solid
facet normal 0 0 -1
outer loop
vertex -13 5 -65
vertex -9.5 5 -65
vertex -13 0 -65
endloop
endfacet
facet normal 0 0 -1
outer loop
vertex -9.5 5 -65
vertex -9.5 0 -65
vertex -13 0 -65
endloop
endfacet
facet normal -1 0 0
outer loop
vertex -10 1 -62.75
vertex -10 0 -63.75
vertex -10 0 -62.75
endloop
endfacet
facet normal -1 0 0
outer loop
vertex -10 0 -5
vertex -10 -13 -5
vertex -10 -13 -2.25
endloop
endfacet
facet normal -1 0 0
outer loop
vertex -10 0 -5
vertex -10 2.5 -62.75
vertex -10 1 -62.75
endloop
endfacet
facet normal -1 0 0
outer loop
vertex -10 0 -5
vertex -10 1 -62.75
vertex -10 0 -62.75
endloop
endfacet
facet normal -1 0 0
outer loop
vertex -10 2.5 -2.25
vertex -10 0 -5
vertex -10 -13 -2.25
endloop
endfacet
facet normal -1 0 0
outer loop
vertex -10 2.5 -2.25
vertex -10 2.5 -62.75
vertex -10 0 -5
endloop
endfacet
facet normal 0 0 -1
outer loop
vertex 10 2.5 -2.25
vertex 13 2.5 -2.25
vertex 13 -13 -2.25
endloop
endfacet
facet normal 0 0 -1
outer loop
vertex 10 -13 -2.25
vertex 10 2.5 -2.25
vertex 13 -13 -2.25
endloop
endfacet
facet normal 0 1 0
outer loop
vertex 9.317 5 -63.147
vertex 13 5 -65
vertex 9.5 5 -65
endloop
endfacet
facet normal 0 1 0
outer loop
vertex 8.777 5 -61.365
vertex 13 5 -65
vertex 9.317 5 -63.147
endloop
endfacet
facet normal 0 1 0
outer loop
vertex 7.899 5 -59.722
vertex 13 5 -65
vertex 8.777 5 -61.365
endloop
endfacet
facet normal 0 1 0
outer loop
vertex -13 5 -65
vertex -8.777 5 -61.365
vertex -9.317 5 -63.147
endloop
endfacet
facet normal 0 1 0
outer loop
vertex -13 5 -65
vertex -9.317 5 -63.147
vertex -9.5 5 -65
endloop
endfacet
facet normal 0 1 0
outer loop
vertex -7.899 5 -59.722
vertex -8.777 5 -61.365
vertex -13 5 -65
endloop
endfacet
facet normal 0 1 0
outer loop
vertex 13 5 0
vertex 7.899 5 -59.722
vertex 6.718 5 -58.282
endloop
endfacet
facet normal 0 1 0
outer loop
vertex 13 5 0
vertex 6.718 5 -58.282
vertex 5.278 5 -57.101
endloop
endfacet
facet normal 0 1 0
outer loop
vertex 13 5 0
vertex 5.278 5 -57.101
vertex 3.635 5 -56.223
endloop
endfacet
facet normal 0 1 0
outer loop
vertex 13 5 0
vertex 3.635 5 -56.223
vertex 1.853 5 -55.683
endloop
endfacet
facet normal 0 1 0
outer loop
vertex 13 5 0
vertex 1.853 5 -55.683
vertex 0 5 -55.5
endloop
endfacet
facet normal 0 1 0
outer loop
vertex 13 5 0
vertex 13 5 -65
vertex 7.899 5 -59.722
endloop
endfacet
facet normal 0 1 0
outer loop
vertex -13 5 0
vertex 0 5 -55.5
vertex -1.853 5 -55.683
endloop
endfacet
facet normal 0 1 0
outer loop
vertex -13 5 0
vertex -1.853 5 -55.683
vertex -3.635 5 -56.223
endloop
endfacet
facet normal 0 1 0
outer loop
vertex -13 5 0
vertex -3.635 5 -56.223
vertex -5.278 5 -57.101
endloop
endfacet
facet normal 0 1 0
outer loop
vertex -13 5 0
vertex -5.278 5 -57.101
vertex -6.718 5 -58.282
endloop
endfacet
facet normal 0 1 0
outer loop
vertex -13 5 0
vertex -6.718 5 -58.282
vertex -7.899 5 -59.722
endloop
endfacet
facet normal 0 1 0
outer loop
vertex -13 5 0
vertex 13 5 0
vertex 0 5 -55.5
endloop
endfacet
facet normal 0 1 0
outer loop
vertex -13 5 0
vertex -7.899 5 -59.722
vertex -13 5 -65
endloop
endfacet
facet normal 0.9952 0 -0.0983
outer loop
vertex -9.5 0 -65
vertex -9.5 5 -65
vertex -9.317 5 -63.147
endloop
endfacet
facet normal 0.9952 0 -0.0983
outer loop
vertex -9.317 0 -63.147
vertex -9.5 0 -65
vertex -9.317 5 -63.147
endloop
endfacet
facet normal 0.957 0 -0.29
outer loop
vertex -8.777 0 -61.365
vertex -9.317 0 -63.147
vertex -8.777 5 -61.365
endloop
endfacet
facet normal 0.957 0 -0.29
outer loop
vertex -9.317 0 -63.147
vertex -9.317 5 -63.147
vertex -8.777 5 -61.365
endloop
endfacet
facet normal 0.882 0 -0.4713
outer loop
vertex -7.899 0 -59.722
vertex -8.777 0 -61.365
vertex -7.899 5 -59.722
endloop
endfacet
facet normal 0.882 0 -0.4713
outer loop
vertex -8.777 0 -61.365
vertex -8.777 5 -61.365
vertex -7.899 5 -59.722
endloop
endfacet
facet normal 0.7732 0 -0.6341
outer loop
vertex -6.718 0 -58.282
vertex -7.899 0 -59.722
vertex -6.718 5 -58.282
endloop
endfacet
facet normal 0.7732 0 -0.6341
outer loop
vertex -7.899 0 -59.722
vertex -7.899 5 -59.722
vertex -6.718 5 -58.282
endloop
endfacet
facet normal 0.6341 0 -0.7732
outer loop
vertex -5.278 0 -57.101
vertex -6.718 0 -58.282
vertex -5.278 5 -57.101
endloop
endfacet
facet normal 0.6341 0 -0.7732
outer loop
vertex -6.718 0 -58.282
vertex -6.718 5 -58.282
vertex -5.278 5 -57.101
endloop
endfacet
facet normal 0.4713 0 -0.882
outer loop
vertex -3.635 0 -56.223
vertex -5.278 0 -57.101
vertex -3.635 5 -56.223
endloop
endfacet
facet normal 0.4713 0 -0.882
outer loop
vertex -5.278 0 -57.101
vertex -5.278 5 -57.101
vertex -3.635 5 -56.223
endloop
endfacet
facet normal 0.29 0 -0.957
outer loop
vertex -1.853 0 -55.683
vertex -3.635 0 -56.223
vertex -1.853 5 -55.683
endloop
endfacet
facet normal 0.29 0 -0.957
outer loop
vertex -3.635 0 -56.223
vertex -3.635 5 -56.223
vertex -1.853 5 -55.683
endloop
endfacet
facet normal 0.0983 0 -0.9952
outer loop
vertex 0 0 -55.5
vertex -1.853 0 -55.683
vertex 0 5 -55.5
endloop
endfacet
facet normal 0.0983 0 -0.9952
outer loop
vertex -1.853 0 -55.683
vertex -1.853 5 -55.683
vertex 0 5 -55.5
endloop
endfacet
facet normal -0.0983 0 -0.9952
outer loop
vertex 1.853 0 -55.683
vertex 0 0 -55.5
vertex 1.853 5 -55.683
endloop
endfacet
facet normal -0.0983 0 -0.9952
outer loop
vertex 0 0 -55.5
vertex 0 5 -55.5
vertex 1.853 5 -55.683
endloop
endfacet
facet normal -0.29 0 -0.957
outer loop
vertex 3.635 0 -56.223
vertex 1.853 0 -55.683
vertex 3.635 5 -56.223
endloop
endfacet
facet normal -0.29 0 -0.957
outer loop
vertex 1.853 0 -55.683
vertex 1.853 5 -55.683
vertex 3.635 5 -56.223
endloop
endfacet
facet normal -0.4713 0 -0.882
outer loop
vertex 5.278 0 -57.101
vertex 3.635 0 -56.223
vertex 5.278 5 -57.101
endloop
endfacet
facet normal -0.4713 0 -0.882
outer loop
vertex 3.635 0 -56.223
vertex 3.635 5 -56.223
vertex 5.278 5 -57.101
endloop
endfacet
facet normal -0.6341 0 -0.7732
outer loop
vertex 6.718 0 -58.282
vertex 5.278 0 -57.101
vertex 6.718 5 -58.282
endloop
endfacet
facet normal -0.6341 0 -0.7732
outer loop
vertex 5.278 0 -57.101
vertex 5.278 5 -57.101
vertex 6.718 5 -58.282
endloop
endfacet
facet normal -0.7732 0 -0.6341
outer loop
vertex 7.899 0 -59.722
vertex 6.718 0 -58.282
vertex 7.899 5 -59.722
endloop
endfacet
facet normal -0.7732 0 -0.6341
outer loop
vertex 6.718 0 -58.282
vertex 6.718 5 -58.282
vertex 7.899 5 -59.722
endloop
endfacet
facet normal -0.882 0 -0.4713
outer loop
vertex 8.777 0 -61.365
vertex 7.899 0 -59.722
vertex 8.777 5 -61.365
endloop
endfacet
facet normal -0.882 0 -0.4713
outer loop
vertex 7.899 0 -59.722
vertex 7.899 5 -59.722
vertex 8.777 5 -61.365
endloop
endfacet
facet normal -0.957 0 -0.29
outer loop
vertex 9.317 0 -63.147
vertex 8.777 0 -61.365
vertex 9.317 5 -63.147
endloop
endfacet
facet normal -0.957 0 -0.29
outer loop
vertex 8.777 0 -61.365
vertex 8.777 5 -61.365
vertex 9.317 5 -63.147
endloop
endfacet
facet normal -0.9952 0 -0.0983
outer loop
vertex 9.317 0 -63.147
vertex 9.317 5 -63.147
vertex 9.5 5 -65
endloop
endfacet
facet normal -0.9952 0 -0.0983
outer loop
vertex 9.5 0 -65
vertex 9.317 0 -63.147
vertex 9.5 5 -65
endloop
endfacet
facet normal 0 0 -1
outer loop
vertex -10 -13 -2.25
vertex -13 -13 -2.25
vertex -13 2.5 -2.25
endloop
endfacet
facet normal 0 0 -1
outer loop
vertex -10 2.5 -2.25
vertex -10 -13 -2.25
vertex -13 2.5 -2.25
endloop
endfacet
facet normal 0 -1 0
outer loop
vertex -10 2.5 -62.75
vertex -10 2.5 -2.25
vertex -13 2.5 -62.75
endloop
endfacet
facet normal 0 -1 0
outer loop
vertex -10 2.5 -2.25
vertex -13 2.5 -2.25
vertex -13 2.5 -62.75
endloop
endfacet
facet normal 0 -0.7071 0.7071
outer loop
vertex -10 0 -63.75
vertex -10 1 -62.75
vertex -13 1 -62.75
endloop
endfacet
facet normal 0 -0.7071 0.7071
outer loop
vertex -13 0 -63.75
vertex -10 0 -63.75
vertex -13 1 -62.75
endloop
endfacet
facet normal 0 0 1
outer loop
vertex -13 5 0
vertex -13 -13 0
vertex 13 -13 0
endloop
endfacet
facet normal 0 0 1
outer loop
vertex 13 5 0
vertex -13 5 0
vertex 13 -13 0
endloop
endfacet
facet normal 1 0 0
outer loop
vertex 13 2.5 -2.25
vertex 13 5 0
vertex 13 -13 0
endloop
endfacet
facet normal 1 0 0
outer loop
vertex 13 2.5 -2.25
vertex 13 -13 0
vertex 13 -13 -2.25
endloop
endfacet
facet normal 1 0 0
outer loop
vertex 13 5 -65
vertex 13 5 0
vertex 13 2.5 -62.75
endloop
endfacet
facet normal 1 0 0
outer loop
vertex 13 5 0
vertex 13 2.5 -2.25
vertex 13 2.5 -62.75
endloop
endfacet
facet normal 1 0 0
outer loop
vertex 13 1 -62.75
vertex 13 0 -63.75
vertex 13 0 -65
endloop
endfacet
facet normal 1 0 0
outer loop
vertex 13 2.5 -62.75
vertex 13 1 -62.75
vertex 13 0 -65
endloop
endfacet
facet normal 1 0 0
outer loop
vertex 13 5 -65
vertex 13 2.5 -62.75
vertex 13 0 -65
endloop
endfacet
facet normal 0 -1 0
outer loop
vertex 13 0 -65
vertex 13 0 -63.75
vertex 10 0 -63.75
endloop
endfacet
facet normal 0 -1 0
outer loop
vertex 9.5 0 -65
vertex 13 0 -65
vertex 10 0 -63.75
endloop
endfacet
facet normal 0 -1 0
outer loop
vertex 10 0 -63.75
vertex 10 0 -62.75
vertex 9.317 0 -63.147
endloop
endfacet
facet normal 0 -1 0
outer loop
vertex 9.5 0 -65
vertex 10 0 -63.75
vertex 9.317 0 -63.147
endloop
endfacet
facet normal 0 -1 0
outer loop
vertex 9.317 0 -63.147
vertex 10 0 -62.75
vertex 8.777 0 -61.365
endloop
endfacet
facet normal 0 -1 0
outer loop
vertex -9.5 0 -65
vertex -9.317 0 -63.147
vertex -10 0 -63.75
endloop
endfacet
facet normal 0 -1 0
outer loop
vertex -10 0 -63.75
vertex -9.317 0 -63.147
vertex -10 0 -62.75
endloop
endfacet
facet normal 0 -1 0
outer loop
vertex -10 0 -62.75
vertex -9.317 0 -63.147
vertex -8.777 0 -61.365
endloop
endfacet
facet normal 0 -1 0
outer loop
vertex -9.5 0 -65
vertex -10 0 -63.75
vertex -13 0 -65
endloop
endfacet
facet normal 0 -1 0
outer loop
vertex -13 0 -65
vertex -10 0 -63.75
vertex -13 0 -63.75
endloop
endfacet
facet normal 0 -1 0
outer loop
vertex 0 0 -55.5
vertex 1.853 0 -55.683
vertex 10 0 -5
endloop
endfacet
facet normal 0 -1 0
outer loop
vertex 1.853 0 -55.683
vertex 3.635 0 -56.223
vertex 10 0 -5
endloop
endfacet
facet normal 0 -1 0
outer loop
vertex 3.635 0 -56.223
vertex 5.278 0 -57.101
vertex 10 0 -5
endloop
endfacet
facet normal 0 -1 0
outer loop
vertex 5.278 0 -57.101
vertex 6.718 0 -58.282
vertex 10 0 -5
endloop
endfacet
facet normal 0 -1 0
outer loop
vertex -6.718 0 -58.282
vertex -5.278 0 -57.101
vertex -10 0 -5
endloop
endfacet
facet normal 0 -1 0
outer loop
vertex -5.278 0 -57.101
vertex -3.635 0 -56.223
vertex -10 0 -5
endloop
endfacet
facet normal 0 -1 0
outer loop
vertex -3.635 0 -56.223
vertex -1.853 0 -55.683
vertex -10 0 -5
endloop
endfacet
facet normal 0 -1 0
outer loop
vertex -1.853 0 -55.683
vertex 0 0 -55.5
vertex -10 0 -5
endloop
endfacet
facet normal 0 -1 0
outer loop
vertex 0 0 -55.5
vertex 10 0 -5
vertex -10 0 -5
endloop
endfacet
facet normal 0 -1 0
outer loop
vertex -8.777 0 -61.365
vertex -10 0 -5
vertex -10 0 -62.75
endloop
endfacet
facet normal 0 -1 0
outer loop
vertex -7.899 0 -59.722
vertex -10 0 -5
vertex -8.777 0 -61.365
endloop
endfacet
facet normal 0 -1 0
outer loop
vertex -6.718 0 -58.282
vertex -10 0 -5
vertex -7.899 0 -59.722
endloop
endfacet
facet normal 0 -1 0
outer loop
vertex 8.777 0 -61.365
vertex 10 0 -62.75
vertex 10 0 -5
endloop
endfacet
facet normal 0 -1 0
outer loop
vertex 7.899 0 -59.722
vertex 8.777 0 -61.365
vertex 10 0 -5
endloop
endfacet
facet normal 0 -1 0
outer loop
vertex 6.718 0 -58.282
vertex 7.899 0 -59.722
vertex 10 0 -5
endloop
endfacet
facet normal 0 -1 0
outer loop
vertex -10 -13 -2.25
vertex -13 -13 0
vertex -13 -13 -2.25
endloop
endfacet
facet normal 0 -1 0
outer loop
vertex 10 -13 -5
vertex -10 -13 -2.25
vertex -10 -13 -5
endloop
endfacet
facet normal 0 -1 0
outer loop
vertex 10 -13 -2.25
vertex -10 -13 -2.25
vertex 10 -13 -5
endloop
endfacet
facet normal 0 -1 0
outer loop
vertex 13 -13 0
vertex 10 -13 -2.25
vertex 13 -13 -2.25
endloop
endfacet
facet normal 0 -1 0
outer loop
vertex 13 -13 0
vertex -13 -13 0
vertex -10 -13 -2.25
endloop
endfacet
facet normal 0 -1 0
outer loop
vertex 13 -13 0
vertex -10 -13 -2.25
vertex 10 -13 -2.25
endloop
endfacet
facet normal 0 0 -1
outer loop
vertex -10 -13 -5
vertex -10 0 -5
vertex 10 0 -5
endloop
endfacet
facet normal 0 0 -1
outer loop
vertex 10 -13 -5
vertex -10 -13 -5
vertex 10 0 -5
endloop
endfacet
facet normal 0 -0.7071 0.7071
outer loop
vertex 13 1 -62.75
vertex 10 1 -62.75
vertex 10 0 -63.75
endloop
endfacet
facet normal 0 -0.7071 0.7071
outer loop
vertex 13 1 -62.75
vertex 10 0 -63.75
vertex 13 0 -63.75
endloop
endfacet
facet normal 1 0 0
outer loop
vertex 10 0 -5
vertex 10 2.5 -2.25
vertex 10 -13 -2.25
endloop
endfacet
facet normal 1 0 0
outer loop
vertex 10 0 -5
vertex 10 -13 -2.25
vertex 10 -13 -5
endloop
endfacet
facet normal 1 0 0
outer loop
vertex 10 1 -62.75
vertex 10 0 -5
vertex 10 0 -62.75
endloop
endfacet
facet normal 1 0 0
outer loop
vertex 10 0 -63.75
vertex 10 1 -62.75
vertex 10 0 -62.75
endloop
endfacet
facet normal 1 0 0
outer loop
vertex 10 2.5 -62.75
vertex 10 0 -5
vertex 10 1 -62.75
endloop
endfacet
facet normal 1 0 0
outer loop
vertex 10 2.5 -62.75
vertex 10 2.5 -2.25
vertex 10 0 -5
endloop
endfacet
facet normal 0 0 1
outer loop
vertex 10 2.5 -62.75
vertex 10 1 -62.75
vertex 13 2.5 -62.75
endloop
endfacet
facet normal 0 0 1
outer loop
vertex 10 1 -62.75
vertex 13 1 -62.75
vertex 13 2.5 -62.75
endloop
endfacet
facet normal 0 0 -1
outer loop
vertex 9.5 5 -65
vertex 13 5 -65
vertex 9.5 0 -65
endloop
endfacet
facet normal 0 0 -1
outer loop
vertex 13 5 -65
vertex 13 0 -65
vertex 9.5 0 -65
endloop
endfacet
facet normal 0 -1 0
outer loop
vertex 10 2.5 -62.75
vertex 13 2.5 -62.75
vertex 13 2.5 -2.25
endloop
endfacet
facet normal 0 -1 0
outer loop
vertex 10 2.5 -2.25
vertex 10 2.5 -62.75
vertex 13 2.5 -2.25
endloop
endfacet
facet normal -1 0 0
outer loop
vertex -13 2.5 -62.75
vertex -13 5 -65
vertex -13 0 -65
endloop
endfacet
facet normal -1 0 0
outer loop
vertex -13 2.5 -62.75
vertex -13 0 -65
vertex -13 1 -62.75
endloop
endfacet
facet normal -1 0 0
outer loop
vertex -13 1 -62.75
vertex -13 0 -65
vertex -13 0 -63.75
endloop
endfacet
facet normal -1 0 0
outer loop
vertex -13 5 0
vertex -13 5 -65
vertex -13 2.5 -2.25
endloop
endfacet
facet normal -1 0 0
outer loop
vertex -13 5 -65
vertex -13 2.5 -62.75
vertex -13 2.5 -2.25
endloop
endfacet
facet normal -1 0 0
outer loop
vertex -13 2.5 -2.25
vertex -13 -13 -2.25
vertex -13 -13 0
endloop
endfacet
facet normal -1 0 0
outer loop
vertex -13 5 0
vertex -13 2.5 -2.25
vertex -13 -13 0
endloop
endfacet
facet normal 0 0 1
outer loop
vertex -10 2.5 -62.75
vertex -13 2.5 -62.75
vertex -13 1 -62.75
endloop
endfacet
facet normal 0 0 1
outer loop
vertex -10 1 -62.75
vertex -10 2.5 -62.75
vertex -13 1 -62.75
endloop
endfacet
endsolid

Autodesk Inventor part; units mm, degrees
ref_plane "YZ Plane" through (0, 0, 0) normal (1, 0, 0) x (0, 1, 0)
ref_plane "XZ Plane" through (0, 0, 0) normal (0, 1, 0) x (-1, 0, 0)
ref_plane "XY Plane" through (0, 0, 0) normal (0, 0, 1) x (1, 0, 0)
sketch "Sketch3" plane through (0, 0, 0) normal (0, 1, 0) x (-1, 0, 0)
  line L0 (13, 0) -> (-13, 0)
  line L1 (-13, 0) -> (-13, -65)
  line L2 (-13, -65) -> (13, -65)
  line L3 (13, -65) -> (13, 0)
  point P0 (0, 0)
  dimension "d8" = 26
  dimension "d9" = 13
  dimension "d18" = 65
extrude "Extrusion3" add sketch "Sketch3" along normal blind 5
sketch "Sketch4" plane through (0, 0, 0) normal (0, -1, 0) x (1, 0, 0)
  line L0 (-13, 0) -> (13, 0) projected
  line L1 (-13, -65) -> (-13, 0) projected
  line L2 (13, -65) -> (-13, -65) projected
  line L3 (13, 0) -> (13, -65) projected
  line L4 (13, 0) -> (-13, 0)
  line L5 (-13, 0) -> (-13, -5)
  line L6 (-13, -5) -> (13, -5)
  line L7 (13, -5) -> (13, 0)
  point P0 (0, 0)
  dimension "d14" = 5
extrude "Extrusion4" add sketch "Sketch4" along normal blind 13 contours L0 L3 L6 L1
sketch "Sketch6" plane through (0, 5, 0) normal (0, 1, 0) x (1, 0, 0)
  line L0 (-13, 0) -> (13, 0) projected
  line L1 (13, 0) -> (13, 65) projected
  line L2 (13, 65) -> (-13, 65) projected
  line L3 (-13, 65) -> (-13, 0) projected
  circle A0 centre (0, 65) radius 9.5
  point P0 (0, 0)
  dimension "d25" = 19
  dimension "d26" = 0
extrude "Extrusion6" cut sketch "Sketch6" against normal through all contours A0 L2 | L2 A0
sketch "Sketch7" plane through (13, 0, -65) normal (1, 0, 0) x (0, 0, -1)
  line L0 (-60, 0) -> (0, 0) projected
  line L1 (0, 0) -> (0, 5) projected
  line L2 (-65, 5) -> (0, 5) projected
  line L3 (-65, -13) -> (-65, 5) projected
  line L4 (-60, -13) -> (-65, -13) projected
  line L5 (-60, 0) -> (-60, -13) projected
  line L6 (-60, -13) -> (-62.75, -13)
  line L7 (-62.75, -13) -> (-62.75, 0)
  line L8 (-62.75, 0) -> (-60, 0)
  line L9 (-60, 0) -> (-60, -13)
  line L10 (-62.75, 0) -> (-2.25, 0)
  line L11 (-2.25, 0) -> (-2.25, 2.5)
  line L12 (-2.25, 2.5) -> (-62.75, 2.5)
  line L13 (-62.75, 2.5) -> (-62.75, 0)
  point P0 (-65, 0)
  dimension "d29" = 2.75
  dimension "d30" = 2.5
  dimension "d31" = 2.25
extrude "Extrusion7" cut sketch "Sketch7" against normal blind 3 contours L8 L13 L12 L11 L0 | L5 L4 L7 L8
mirror "Mirror2" about plane through (0, 0, 0) normal (1, 0, 0) of "Extrusion7"
chamfer "Chamfer1" distance 1 angle 45 2 edges at (11.5, 0, -62.75) (-11.5, 0, -62.75)
equation "\"d9\" = 0.5 * d8"
properties part number "Roof Clip"
